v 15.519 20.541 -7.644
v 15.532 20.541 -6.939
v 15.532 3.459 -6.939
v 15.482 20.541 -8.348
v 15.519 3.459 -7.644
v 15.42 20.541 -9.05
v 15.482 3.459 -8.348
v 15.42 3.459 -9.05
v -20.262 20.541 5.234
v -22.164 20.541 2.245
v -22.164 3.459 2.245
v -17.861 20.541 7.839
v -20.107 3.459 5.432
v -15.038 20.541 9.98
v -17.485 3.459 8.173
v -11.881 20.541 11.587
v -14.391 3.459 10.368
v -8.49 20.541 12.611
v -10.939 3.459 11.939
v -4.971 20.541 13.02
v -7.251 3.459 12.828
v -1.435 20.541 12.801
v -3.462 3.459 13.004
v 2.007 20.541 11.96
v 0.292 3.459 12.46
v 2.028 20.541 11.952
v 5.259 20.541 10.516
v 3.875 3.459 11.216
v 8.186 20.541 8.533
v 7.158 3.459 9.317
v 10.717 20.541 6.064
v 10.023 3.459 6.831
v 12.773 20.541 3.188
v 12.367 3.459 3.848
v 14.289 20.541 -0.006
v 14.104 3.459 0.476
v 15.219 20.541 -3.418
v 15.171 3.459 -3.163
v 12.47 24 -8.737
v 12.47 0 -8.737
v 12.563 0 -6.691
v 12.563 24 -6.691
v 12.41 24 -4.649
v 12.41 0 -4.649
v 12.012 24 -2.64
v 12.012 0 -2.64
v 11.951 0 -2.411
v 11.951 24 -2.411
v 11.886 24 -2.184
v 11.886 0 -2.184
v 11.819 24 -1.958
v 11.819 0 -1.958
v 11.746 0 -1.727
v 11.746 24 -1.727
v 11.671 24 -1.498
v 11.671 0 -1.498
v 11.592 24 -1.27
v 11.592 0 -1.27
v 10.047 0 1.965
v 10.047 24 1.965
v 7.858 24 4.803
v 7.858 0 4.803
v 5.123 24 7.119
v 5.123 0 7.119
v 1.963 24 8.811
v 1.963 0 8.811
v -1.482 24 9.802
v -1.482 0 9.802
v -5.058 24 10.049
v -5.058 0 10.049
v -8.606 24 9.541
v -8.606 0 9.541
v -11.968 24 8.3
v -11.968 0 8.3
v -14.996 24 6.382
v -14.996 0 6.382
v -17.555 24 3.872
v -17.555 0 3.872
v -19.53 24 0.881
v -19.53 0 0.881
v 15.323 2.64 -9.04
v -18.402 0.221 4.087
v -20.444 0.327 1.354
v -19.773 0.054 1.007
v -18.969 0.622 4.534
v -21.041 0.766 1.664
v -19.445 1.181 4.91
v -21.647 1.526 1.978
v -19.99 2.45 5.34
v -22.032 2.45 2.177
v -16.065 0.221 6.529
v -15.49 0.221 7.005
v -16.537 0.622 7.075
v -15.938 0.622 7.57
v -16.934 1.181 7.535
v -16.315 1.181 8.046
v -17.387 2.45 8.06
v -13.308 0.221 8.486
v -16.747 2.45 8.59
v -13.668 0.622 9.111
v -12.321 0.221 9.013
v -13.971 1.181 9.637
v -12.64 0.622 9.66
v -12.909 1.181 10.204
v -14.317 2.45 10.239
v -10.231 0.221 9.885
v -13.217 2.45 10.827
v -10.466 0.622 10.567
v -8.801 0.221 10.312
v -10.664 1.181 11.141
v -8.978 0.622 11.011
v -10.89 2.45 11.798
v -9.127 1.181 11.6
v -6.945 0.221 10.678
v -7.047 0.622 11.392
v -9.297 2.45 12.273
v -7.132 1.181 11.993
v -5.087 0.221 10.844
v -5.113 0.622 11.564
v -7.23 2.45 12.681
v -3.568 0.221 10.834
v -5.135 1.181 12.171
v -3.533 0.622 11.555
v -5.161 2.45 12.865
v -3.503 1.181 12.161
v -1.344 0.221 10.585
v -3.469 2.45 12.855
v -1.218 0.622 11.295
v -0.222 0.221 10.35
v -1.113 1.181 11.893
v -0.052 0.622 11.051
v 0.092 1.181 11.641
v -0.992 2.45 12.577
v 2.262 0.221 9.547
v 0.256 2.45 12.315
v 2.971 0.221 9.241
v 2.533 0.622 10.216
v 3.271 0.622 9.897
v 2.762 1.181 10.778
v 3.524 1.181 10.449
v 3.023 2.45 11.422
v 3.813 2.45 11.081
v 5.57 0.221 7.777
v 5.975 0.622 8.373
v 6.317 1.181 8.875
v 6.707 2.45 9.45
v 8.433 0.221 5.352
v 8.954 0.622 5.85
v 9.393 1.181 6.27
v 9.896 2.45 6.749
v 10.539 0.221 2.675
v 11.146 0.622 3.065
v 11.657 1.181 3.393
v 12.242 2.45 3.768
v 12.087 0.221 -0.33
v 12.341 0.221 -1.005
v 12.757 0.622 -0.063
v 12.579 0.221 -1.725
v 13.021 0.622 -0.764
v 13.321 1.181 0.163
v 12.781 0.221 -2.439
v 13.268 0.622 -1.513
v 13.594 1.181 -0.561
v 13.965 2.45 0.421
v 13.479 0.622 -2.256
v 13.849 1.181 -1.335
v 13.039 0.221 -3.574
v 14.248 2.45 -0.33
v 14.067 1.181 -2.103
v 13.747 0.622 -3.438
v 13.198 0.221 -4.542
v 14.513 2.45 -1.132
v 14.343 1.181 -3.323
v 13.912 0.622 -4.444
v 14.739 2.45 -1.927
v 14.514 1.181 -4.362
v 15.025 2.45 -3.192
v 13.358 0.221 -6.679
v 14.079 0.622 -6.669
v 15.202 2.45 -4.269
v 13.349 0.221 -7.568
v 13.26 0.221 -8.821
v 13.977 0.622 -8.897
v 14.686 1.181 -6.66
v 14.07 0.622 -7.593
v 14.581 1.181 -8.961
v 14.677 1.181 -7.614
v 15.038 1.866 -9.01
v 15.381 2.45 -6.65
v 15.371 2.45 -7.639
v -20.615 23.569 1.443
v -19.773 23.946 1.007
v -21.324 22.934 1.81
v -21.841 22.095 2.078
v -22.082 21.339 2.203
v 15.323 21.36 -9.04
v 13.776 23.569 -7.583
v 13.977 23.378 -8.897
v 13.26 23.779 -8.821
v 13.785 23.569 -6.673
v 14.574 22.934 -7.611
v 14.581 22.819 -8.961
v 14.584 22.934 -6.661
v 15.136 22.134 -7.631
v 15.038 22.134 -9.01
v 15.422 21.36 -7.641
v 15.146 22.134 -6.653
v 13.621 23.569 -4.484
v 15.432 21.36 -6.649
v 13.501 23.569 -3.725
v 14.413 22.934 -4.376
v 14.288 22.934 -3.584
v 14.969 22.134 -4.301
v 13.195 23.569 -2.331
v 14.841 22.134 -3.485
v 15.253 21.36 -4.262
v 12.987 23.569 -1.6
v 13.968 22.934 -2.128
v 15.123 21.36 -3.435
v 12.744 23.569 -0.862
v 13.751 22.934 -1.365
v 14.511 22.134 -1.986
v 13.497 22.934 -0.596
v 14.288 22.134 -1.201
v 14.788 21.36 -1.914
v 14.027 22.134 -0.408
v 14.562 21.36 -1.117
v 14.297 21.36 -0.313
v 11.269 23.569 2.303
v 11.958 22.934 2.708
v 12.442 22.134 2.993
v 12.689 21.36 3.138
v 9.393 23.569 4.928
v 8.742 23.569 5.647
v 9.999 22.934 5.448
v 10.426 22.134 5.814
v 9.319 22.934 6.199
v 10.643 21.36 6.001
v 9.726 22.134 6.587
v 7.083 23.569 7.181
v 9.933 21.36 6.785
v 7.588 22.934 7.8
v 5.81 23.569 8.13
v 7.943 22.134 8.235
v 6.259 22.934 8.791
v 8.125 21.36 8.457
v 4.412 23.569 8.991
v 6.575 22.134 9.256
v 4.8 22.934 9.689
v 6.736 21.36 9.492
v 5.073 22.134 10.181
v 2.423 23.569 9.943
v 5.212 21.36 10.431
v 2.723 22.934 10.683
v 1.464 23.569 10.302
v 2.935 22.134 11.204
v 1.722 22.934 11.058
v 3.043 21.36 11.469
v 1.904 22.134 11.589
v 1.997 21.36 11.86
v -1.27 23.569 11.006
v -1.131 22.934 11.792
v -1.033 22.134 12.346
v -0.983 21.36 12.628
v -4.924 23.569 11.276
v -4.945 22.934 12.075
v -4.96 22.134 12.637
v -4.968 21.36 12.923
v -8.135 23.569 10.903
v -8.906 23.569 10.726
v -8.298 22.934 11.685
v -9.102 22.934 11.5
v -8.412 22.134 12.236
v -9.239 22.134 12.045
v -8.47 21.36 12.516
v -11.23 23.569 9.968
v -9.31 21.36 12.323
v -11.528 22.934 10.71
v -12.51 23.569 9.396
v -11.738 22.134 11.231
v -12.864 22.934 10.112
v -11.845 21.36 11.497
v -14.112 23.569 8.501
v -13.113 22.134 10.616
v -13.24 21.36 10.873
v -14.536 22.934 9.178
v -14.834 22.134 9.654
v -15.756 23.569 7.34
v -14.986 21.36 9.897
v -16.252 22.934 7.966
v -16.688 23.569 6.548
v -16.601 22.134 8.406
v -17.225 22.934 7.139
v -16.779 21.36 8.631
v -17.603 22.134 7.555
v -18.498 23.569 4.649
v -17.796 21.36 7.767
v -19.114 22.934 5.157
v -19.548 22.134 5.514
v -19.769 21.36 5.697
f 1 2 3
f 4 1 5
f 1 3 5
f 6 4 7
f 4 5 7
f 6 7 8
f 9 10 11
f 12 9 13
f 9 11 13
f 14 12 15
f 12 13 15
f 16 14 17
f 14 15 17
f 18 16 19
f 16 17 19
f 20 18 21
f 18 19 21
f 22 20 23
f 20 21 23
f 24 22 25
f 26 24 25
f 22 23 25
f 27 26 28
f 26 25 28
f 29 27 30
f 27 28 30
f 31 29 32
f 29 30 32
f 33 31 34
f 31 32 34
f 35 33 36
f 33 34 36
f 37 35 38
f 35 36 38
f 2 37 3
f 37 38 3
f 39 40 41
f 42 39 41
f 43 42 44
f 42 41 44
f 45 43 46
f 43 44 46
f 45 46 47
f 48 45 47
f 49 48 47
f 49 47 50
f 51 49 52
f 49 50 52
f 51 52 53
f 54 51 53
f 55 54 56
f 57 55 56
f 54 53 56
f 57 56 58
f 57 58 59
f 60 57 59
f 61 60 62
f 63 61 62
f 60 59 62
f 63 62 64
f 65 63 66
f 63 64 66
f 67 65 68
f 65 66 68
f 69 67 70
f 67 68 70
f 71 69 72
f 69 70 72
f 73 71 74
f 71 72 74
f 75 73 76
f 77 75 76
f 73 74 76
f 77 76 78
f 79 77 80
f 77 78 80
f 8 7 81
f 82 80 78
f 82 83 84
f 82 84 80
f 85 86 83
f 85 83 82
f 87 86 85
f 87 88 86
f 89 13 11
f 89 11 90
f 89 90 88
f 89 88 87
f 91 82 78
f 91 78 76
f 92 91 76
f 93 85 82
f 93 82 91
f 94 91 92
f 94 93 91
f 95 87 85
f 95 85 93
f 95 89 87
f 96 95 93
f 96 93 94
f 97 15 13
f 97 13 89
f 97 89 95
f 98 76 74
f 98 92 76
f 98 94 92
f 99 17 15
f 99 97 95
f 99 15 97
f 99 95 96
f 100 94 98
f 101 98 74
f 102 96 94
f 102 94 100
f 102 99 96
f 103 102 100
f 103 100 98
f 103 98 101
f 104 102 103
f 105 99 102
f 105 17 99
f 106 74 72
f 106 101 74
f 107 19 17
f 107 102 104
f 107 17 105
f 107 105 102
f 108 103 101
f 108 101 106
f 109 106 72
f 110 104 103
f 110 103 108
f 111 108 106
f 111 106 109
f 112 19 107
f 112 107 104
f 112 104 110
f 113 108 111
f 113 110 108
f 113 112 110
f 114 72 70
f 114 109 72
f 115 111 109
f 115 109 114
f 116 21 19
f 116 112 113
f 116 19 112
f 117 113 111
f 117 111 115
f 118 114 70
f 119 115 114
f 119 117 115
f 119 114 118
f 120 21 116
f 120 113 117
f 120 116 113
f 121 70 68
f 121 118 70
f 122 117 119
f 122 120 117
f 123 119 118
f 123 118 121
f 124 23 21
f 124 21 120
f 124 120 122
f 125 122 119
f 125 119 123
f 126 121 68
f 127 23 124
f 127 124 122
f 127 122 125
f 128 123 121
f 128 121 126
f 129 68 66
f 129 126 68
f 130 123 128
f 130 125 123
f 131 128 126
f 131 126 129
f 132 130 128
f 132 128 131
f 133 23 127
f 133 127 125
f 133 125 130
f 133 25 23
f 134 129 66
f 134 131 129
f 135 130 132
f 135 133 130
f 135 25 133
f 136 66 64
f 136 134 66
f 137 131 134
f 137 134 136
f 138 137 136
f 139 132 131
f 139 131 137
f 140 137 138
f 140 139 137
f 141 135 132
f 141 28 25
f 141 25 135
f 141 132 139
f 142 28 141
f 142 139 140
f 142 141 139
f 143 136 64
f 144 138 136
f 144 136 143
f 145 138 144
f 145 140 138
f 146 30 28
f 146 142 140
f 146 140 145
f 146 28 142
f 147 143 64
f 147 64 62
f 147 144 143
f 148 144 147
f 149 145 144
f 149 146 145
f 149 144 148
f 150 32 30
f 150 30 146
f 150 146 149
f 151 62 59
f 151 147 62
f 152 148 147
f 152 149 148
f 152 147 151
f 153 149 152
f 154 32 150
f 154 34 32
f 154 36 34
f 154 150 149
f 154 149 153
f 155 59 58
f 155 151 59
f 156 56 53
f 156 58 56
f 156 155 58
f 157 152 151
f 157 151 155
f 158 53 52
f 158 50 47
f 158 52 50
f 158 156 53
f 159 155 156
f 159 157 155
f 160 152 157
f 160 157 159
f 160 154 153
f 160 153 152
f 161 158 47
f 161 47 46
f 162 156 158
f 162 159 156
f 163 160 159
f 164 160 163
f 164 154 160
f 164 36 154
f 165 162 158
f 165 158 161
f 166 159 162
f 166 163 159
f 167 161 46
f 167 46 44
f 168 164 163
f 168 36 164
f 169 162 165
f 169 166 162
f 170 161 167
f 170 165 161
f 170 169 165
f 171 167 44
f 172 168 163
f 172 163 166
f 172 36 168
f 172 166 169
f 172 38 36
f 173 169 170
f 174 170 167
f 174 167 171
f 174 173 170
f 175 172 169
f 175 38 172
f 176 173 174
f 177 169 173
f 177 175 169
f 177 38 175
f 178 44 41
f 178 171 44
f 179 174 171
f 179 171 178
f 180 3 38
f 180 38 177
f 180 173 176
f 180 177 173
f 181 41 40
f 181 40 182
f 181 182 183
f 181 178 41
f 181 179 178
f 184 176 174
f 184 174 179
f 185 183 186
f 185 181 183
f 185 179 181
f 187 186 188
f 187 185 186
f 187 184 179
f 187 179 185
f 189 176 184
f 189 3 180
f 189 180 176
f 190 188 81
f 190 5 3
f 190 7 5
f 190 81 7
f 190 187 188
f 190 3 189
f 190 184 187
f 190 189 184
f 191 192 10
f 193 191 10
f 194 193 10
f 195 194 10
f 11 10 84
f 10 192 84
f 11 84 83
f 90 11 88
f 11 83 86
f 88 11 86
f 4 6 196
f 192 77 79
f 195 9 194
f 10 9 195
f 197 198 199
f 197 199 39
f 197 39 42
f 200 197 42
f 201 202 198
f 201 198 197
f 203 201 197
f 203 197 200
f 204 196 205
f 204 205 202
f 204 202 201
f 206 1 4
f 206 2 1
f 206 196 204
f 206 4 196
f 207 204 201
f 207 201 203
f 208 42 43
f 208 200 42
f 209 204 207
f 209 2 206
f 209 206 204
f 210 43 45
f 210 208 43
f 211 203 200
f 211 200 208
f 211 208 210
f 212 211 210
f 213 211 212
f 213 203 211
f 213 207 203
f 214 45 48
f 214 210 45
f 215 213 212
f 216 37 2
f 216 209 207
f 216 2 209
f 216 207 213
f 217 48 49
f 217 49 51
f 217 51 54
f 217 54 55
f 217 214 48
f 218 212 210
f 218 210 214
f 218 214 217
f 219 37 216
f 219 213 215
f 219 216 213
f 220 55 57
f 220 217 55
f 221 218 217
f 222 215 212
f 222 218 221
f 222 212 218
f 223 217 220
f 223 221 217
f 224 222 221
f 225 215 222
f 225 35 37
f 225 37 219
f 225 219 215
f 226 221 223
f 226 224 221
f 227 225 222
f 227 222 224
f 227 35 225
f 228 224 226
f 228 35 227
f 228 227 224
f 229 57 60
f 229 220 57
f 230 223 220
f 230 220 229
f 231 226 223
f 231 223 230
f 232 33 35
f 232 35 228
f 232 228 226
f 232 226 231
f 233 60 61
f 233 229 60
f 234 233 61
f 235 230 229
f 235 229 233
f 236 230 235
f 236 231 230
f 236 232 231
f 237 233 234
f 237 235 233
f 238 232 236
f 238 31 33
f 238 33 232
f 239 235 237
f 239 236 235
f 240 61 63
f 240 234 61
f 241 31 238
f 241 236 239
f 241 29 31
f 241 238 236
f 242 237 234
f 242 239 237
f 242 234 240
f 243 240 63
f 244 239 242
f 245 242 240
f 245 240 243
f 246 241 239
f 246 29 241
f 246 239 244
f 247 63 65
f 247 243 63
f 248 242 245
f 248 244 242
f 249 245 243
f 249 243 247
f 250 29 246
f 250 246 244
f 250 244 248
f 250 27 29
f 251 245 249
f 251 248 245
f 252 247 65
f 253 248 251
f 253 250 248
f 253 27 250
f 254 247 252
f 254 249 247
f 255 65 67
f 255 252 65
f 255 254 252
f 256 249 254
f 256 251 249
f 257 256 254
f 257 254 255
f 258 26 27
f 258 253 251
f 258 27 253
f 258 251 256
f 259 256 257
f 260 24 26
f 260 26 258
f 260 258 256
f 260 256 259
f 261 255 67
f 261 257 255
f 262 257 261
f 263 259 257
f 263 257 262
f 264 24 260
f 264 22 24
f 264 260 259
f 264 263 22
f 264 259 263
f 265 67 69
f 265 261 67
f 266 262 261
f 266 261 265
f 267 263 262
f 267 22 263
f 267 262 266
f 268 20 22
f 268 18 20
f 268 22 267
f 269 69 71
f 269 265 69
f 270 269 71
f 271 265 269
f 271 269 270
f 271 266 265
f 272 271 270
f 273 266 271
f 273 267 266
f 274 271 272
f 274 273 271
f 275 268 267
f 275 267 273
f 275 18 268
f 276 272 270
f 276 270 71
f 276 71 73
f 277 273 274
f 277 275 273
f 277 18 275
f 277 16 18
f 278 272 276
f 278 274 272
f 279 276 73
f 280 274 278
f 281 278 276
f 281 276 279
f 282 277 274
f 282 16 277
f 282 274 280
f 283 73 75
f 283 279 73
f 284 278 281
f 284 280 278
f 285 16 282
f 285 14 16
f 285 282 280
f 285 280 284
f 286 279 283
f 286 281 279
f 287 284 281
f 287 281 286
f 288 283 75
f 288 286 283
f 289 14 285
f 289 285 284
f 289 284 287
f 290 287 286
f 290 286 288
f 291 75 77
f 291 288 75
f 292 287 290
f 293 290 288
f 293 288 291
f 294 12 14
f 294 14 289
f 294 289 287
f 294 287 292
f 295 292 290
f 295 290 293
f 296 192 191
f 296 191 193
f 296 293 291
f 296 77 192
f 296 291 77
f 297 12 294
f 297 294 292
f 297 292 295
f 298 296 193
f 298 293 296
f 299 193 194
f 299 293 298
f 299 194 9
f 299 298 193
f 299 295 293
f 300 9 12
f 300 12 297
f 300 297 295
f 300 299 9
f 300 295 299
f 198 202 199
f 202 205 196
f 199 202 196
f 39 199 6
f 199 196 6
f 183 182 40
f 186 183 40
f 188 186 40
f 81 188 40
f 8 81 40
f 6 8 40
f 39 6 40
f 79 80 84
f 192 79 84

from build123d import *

# Parameters (mm, degrees)
BOSS_EXTRUDE1_DEPTH = 24
FILLET1_R           = 3.5


with BuildPart() as part:
    # Sketch2 → Boss-Extrude1 (new body)
    with BuildSketch(Plane(origin=(0, 0, 0), x_dir=(1, 0, 0), z_dir=(0, 1, 0))):
        with BuildLine():
            ThreePointArc((11.591585182, 1.269721351), (-3.263225558, -10.020142683), (-19.529660289, -0.880693402))
            Line((-19.529660289, -0.880693402), (-19.773089177, -1.006807758))
            Line((-19.773089177, -1.006807758), (-22.163972243, -2.245463863))
            ThreePointArc((-22.163972243, -2.245463863), (0.291704356, -12.459871192), (15.531753085, 6.939418571))
            ThreePointArc((15.531753085, 6.939418571), (15.503757233, 7.996392633), (15.419848185, 9.050402694))
            Line((15.419848185, 9.050402694), (12.469626172, 8.736734142))
            ThreePointArc((12.469626172, 8.736734142), (12.517251304, 5.667453249), (12.012150504, 2.639644382))
            ThreePointArc((12.012150504, 2.639644382), (11.918925763, 2.297657269), (11.818590923, 1.957688215))
            ThreePointArc((11.818590923, 1.957688215), (11.708753165, 1.61249542), (11.591585182, 1.269721351))
        make_face()
    extrude(amount=BOSS_EXTRUDE1_DEPTH)

    # Fillet1
    # the kernel refuses this fillet: 3.5 mm, written as the material it takes off along each edge
    with BuildSketch(Plane(origin=(-4.43509674, 0, -6.939418571), x_dir=(-0.9990167342617219, 0, 0.04433468918402287), z_dir=(-0.04433468918402287, 0, -0.9990167342617219))) as fillet1_piece_1:
        with BuildLine():
            CenterArc((16.466849825, 3.45915465), FILLET1_R, 278.761897774, 81.238102226)
            Line((17, 0), (17.010663004, -0.069183093))
            ThreePointArc((17.010663004, -0.069183093), (18.483424912, -0.07), (19.966849825, -0.07))
            Line((19.966849825, -0.07), (20.036849825, 0))
            Line((20.036849825, 0), (20.036849825, 3.45915465))
            Line((20.036849825, 3.45915465), (19.966849825, 3.45915465))
        make_face()
    revolve(axis=Axis((-4.43509674, 0, -6.939418571), (0, 1, 0)), revolution_arc=208.374392147, mode=Mode.SUBTRACT)
    with BuildSketch(Plane(origin=(-4.43509674, 24, -6.939418571), x_dir=(0.85792670476254, 0, -0.5137720985566359), z_dir=(-0.5137720985566359, 0, -0.85792670476254))) as fillet1_piece_2:
        with BuildLine():
            CenterArc((16.466849825, 3.45915465), FILLET1_R, 278.761897774, 81.238102226)
            Line((19.966849825, 3.45915465), (20.036849825, 3.45915465))
            Line((20.036849825, 3.45915465), (20.036849825, 0))
            Line((20.036849825, 0), (19.966849825, -0.07))
            ThreePointArc((19.966849825, -0.07), (18.483424912, -0.07), (17.010663004, -0.069183093))
            Line((17.010663004, -0.069183093), (17, 0))
        make_face()
    revolve(axis=Axis((-4.43509674, 24, -6.939418571), (0, -1, 0)), revolution_arc=208.374392147, mode=Mode.SUBTRACT)


solid = part.part
